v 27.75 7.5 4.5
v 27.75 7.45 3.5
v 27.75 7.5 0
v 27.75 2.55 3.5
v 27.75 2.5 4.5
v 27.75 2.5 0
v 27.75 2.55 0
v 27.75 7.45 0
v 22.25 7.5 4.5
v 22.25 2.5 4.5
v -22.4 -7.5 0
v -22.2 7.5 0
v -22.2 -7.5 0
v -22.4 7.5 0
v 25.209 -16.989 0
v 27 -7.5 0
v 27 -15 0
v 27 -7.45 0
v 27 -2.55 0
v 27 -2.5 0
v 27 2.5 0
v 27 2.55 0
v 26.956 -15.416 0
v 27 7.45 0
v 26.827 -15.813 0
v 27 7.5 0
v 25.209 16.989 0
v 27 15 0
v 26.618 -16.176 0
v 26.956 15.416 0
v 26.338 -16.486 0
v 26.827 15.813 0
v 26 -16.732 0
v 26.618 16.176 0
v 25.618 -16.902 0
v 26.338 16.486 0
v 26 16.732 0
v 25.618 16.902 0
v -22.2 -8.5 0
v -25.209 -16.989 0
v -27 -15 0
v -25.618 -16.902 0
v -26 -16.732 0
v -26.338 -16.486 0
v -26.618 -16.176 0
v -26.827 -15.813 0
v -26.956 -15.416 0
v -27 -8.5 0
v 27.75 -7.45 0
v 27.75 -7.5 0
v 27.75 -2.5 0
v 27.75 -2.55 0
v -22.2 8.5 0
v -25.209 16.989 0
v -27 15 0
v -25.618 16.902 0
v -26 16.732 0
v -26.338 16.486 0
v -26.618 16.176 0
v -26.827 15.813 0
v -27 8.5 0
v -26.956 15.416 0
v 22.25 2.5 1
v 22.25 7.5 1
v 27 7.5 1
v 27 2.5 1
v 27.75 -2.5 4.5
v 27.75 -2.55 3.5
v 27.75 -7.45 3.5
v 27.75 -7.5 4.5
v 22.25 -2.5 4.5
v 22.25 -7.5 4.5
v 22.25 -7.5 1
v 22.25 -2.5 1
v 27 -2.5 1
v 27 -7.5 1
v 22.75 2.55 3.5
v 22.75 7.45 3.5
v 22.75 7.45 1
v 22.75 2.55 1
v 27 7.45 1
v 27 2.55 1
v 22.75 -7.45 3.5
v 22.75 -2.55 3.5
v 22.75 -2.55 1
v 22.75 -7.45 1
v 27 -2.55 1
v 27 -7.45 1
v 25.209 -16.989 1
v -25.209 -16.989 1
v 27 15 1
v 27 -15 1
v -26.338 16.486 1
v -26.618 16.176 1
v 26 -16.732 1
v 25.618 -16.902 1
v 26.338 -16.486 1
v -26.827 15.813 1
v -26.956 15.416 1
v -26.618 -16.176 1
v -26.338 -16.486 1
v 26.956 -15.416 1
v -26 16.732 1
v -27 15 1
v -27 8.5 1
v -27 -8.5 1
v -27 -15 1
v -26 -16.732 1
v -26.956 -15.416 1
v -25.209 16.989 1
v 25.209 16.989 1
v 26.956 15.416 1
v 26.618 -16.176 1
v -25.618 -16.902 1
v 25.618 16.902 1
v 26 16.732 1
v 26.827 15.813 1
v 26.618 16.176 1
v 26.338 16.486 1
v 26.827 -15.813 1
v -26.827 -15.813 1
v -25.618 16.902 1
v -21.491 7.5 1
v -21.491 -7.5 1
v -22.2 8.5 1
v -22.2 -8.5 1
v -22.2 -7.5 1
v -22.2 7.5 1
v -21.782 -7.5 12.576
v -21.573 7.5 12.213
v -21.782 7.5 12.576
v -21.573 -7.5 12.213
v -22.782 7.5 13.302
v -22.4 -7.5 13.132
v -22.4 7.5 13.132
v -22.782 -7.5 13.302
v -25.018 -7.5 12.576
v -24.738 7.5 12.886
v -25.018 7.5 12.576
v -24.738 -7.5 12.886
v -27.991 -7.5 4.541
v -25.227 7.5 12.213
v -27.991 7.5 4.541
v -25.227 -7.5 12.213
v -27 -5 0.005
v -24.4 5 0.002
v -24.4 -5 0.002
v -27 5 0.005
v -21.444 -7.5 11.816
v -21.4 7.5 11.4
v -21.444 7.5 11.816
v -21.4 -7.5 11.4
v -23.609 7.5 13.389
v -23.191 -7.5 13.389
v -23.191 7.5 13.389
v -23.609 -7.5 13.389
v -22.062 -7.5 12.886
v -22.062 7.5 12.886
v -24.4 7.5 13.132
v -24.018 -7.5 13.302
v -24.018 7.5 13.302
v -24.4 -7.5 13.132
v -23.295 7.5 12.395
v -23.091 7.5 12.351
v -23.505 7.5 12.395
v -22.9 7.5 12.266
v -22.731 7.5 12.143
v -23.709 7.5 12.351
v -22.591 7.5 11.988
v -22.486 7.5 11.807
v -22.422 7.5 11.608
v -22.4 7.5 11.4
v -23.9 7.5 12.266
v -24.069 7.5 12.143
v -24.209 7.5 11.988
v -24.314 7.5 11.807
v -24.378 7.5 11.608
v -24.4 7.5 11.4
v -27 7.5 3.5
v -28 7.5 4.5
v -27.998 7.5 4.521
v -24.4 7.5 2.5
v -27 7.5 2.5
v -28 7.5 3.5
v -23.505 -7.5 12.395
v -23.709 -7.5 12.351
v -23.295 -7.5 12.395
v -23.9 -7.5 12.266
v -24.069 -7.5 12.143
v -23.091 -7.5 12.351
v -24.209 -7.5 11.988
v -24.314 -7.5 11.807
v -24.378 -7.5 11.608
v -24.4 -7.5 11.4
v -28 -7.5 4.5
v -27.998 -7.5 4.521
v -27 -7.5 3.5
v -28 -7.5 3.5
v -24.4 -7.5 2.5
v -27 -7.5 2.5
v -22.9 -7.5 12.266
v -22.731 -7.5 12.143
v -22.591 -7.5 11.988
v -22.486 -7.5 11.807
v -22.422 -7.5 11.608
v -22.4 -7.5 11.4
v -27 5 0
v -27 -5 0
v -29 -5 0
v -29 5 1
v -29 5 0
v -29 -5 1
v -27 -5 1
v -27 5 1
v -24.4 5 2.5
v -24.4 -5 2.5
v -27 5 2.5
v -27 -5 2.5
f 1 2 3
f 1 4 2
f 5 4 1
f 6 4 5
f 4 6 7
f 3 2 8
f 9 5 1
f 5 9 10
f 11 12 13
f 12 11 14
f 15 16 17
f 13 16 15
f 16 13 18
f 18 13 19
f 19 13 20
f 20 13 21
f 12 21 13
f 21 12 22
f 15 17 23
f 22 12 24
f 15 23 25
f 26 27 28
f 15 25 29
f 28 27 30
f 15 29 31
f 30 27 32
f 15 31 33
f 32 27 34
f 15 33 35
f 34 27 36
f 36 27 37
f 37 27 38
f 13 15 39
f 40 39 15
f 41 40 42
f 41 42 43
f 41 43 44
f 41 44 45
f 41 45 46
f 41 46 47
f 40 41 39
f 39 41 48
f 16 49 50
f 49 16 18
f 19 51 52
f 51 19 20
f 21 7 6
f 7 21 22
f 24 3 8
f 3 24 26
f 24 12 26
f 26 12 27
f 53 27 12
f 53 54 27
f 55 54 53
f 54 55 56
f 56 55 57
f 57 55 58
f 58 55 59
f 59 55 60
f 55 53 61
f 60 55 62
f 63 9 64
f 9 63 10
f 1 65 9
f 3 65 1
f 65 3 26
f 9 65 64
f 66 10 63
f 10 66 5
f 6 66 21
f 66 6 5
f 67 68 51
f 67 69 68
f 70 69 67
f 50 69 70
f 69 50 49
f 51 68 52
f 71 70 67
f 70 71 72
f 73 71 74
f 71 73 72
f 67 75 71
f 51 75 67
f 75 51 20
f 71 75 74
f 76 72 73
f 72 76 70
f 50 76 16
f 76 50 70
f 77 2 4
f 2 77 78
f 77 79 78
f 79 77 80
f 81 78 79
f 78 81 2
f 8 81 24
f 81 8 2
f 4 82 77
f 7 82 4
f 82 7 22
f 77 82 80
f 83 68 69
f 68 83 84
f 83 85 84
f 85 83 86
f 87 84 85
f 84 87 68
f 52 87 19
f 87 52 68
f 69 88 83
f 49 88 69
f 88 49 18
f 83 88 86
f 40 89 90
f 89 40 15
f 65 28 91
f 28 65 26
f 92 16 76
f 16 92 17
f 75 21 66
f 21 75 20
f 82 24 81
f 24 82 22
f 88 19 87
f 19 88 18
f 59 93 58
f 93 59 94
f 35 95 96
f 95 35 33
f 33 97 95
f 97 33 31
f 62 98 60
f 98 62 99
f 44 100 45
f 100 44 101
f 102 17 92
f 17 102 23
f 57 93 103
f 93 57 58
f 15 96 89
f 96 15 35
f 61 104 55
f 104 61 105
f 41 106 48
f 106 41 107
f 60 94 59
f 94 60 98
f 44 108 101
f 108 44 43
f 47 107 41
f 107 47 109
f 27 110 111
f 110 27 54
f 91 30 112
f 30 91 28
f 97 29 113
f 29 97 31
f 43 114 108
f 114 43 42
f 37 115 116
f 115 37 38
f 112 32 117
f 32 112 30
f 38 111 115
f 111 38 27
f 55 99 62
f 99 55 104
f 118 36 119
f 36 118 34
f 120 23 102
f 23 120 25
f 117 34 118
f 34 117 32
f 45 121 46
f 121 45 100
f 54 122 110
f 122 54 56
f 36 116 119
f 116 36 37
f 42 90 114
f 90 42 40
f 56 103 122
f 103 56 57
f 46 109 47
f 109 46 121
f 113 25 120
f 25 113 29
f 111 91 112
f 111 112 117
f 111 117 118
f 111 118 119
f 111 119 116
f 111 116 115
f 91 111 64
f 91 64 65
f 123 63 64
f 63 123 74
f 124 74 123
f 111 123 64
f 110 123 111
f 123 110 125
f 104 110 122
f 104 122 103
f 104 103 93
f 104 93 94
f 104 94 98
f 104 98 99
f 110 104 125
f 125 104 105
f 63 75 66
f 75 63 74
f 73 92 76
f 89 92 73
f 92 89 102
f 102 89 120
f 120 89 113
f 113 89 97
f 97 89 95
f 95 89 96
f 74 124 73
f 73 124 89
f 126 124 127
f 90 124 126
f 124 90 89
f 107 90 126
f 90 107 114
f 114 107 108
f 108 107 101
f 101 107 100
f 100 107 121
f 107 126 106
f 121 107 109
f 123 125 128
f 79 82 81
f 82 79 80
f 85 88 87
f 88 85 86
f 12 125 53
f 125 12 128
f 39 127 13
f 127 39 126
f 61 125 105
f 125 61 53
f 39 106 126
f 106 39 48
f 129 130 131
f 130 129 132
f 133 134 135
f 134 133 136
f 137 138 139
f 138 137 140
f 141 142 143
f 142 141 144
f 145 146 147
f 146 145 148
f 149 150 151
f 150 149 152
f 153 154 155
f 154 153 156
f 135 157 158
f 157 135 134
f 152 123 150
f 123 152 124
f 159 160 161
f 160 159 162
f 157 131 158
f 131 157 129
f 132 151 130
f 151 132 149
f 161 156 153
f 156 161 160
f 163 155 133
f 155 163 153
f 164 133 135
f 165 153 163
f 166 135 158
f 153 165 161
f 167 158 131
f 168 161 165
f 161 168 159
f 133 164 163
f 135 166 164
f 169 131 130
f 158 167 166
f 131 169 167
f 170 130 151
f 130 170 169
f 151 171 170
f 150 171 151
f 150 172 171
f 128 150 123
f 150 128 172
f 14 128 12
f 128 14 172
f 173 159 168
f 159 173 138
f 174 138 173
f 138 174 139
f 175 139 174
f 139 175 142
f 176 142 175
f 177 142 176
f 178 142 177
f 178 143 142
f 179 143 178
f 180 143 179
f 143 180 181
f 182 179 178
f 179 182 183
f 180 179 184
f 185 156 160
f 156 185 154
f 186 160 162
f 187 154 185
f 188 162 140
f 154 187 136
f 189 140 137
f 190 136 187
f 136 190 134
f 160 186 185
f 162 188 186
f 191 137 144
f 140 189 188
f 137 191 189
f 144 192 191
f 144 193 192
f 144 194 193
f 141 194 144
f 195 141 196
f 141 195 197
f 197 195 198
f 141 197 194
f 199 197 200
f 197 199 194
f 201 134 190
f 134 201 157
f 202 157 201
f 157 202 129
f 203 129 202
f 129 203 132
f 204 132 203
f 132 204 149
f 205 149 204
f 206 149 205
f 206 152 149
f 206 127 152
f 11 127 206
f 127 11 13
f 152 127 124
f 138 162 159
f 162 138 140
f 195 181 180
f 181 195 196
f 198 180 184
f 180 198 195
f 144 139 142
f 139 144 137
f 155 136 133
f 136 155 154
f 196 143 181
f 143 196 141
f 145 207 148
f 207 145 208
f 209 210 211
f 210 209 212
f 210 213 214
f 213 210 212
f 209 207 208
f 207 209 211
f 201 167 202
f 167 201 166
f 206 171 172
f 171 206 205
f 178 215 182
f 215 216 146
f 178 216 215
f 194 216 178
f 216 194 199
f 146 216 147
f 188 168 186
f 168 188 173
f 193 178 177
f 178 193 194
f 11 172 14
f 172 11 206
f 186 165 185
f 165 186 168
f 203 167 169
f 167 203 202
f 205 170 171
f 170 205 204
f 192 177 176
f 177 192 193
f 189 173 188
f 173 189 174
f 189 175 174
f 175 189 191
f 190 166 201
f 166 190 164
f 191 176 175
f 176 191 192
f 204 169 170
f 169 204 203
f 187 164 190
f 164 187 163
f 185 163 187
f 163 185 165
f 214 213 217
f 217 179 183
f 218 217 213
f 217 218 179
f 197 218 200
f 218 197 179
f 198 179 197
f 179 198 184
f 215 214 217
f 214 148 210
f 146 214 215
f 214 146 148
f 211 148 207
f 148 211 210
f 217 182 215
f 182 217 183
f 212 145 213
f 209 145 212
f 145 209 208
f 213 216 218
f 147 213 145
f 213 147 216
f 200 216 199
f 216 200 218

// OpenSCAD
// This thing generates custom battery covers
//
// v2.0
//
// Licenced under Creative Commons: Attribution, Share-Alike
//		http://creativecommons.org/licenses/by-sa/3.0/
// For attribution you can direct people to the original file on thingiverse:
// 		http://www.thingiverse.com/thing:243269

// ================ variables

//CUSTOMIZER VARIABLES

/* [Basic] */

// how long the battery cover is.  (This dimension is in the clip-to-ears direction.)
length=50; // 10:200

// how wide the battery cover is
width=30; // 10:200

// how thick the battery cover is
thickness=0.5;  // 0.1:10

// radius for rounding over the corners of the battery cover
corner_radius=2;  // 0:10

// how thick the case plastic is
case_thickness=3.5;

// for generating support material.  Can be 0.
support_thickness=0.05;

/* [Ears] */

// how wide the ear tabs are
ear_width=5;  // 2:25

// how wide the ear tabs are
ear_length=5;  // 2:25

// how far apart the ear tabs are.  (To create one wide tab, just set this to 0.)
ear_spacing=10;  // 1:100

// How thick the case is where the ears attach.  Usually it should be the same as "thickness" on the "basic" tab
ear_case_thickness=3.5;  // 0.1:10

/* [Clip] */

// How wide the clip is
clip_width=15; // 5:50

// How deep the clip is (overhang)
clip_depth=1;

// How long the clip is
clip_length=5.8; // 5.8

// This is used for a side-engagement clip.  Most clips are this way now.  It measures how wide the small part of the clip is.
clip_width_sides=10;

// This is for a front-engagement clip.  If unused, set it to 0, otherwise, how long the catch will be (usually about 2-3mm)
clip_length_catch=1;

// How far the clip is in/out relative to the edge of the battery cover.
//clip_indent=0;  // -15:15

// This is how far down into the battery case the clip engages.  Usually it should be the same as "thickness" on the "basic" tab
clip_case_thickness=3.5;  // 0.1:10

// The thickness of the finger tab
tab_thickness=1;

/* [Gussets] */

// Which direction the support gussets go
gusset_orientation=0; // [0:clip_lengthwise,1:clip_widthwise]

// How thick the gussets are (set to 0 to turn off gussets)
gusset_thickness=0;

// How high the gussets are
gusset_height=0;

// How far apart the gussets are
gusset_spacing=0;

/* [Advanced] */

// Resolution
$fn=30;

/* [hidden] */

scoche=0.01;
halfscoche=scoche/2;

cover(width,length,thickness,case_thickness,gusset_thickness,corner_radius,ear_width,ear_spacing,clip_width,clip_width_sides,clip_length,clip_length_catch,clip_case_thickness,ear_length,tab_thickness);

module clip(clip_width=15,clip_width_sides=10,clip_length=1,clip_case_thickness=5,clip_length_catch=3,tab_thickness=3) {
	top_r=2;
	top_r_x=3.6;
	top_r_y=10.4;
	inside_corner_x=5;
	overlap_tab_w=2;
	inside_void_d1=2;
	inside_void_d2=2;
	inside_void_x=3.6;
	
	rotate([90,0,0]){
		difference () {
			union(){ // the outside shape
				hull () {
					translate([0,0,0]) cylinder(r=1,h=clip_width); // outside radius
					translate([inside_corner_x-1/2,-1,0]) cube([1,1,clip_width]); // inside corner
					translate([top_r_x,top_r_y,0]) cylinder(r=top_r,h=clip_width); // top
					if(clip_length_catch>0){
						translate([-clip_length_catch+0.1,clip_case_thickness,0]) cylinder(r=0.1,h=clip_width); // add a front overhang
					}
				}
				translate([-overlap_tab_w,-1,0]) cube([overlap_tab_w,tab_thickness,clip_width]); // the overlap tab
			}
			union(){ 
				translate([inside_void_x,0,0]) hull() { // The inside void
					translate([0,10.4,-clip_width/2]) cylinder(r=inside_void_d1/2,h=clip_width*2);
					translate([-inside_void_d2/2,-tab_thickness-scoche,-clip_width/2]) cube([inside_void_d2,scoche,clip_width*2]);
				}
				// trim the tab overhang
				translate([-tab_thickness-clip_depth,0,-clip_width/2]) cube([clip_depth*2,clip_case_thickness-tab_thickness,clip_width*2]); // trim off outside
				// trim the tab width
				translate([-2-halfscoche,-2,-(clip_width-clip_width_sides)/2]) cube([5+scoche,clip_case_thickness,(clip_width-clip_width_sides)]); // trim off left side
				translate([-2-halfscoche,-2,clip_width-(clip_width-clip_width_sides)/2]) cube([5+scoche,clip_case_thickness,(clip_width-clip_width_sides)]); // trim off right side
			}
		}
	}
}

module cover(width=30,length=60,thickness=0.5,case_thickness=3.9,gusset_thickness=4.5,corner_radius=1,ear_width=7.5,ear_spacing=29,clip_width=15,clip_width_sides=10,clip_length=1,clip_length_catch=3,clip_case_thickness=5,ear_length=5.8,tab_thickness=3) {
	clip_thickness=1;
	difference(){
		// the base shape
		union(){
			// the face
			translate([-length/2,-width/2,0]) 
			minkowski(){
				cube([length,width,thickness]);
				if(corner_radius>0) cylinder(r=corner_radius,h=thickness);
			}
			// gussets
			translate([8.1,0,0]) cube([54.8,1.6,gusset_thickness]);
			translate([8.1,64.4,0]) cube([54.8,1.6,gusset_thickness]);
			
			difference(){// the ears
				union(){
					translate([(length-ear_length-thickness)/2,(ear_spacing/2)-(ear_width/2),0]) cube([ear_length+thickness,ear_width,case_thickness+thickness*2]);
					translate([(length-ear_length-thickness)/2,(-ear_spacing/2)+(-ear_width/2),0]) cube([ear_length+thickness,ear_width,case_thickness+thickness*2]);
				}	
				translate([(length-ear_length+thickness)/2,(ear_spacing/2)-(ear_width/2)+support_thickness,0]) cube([ear_length,ear_width-support_thickness*2,case_thickness]);
				translate([(length-ear_length+thickness)/2,(-ear_spacing/2)+(-ear_width/2)+support_thickness,0]) cube([ear_length,ear_width-support_thickness*2,case_thickness]);
			}
		}
		union(){
			// hole for clip
			translate([(-length/2)-corner_radius,-clip_width/2-1,-scoche]) cube([clip_length-clip_thickness,clip_width+2,thickness*2+scoche]); // the hole for the clip
			// cutout for ears
		}
	}
	// the clip itsself
	translate([(-length/2)-corner_radius,clip_width/2,1]) clip(clip_width,clip_width_sides,clip_length,clip_case_thickness,clip_length_catch,tab_thickness);
}
